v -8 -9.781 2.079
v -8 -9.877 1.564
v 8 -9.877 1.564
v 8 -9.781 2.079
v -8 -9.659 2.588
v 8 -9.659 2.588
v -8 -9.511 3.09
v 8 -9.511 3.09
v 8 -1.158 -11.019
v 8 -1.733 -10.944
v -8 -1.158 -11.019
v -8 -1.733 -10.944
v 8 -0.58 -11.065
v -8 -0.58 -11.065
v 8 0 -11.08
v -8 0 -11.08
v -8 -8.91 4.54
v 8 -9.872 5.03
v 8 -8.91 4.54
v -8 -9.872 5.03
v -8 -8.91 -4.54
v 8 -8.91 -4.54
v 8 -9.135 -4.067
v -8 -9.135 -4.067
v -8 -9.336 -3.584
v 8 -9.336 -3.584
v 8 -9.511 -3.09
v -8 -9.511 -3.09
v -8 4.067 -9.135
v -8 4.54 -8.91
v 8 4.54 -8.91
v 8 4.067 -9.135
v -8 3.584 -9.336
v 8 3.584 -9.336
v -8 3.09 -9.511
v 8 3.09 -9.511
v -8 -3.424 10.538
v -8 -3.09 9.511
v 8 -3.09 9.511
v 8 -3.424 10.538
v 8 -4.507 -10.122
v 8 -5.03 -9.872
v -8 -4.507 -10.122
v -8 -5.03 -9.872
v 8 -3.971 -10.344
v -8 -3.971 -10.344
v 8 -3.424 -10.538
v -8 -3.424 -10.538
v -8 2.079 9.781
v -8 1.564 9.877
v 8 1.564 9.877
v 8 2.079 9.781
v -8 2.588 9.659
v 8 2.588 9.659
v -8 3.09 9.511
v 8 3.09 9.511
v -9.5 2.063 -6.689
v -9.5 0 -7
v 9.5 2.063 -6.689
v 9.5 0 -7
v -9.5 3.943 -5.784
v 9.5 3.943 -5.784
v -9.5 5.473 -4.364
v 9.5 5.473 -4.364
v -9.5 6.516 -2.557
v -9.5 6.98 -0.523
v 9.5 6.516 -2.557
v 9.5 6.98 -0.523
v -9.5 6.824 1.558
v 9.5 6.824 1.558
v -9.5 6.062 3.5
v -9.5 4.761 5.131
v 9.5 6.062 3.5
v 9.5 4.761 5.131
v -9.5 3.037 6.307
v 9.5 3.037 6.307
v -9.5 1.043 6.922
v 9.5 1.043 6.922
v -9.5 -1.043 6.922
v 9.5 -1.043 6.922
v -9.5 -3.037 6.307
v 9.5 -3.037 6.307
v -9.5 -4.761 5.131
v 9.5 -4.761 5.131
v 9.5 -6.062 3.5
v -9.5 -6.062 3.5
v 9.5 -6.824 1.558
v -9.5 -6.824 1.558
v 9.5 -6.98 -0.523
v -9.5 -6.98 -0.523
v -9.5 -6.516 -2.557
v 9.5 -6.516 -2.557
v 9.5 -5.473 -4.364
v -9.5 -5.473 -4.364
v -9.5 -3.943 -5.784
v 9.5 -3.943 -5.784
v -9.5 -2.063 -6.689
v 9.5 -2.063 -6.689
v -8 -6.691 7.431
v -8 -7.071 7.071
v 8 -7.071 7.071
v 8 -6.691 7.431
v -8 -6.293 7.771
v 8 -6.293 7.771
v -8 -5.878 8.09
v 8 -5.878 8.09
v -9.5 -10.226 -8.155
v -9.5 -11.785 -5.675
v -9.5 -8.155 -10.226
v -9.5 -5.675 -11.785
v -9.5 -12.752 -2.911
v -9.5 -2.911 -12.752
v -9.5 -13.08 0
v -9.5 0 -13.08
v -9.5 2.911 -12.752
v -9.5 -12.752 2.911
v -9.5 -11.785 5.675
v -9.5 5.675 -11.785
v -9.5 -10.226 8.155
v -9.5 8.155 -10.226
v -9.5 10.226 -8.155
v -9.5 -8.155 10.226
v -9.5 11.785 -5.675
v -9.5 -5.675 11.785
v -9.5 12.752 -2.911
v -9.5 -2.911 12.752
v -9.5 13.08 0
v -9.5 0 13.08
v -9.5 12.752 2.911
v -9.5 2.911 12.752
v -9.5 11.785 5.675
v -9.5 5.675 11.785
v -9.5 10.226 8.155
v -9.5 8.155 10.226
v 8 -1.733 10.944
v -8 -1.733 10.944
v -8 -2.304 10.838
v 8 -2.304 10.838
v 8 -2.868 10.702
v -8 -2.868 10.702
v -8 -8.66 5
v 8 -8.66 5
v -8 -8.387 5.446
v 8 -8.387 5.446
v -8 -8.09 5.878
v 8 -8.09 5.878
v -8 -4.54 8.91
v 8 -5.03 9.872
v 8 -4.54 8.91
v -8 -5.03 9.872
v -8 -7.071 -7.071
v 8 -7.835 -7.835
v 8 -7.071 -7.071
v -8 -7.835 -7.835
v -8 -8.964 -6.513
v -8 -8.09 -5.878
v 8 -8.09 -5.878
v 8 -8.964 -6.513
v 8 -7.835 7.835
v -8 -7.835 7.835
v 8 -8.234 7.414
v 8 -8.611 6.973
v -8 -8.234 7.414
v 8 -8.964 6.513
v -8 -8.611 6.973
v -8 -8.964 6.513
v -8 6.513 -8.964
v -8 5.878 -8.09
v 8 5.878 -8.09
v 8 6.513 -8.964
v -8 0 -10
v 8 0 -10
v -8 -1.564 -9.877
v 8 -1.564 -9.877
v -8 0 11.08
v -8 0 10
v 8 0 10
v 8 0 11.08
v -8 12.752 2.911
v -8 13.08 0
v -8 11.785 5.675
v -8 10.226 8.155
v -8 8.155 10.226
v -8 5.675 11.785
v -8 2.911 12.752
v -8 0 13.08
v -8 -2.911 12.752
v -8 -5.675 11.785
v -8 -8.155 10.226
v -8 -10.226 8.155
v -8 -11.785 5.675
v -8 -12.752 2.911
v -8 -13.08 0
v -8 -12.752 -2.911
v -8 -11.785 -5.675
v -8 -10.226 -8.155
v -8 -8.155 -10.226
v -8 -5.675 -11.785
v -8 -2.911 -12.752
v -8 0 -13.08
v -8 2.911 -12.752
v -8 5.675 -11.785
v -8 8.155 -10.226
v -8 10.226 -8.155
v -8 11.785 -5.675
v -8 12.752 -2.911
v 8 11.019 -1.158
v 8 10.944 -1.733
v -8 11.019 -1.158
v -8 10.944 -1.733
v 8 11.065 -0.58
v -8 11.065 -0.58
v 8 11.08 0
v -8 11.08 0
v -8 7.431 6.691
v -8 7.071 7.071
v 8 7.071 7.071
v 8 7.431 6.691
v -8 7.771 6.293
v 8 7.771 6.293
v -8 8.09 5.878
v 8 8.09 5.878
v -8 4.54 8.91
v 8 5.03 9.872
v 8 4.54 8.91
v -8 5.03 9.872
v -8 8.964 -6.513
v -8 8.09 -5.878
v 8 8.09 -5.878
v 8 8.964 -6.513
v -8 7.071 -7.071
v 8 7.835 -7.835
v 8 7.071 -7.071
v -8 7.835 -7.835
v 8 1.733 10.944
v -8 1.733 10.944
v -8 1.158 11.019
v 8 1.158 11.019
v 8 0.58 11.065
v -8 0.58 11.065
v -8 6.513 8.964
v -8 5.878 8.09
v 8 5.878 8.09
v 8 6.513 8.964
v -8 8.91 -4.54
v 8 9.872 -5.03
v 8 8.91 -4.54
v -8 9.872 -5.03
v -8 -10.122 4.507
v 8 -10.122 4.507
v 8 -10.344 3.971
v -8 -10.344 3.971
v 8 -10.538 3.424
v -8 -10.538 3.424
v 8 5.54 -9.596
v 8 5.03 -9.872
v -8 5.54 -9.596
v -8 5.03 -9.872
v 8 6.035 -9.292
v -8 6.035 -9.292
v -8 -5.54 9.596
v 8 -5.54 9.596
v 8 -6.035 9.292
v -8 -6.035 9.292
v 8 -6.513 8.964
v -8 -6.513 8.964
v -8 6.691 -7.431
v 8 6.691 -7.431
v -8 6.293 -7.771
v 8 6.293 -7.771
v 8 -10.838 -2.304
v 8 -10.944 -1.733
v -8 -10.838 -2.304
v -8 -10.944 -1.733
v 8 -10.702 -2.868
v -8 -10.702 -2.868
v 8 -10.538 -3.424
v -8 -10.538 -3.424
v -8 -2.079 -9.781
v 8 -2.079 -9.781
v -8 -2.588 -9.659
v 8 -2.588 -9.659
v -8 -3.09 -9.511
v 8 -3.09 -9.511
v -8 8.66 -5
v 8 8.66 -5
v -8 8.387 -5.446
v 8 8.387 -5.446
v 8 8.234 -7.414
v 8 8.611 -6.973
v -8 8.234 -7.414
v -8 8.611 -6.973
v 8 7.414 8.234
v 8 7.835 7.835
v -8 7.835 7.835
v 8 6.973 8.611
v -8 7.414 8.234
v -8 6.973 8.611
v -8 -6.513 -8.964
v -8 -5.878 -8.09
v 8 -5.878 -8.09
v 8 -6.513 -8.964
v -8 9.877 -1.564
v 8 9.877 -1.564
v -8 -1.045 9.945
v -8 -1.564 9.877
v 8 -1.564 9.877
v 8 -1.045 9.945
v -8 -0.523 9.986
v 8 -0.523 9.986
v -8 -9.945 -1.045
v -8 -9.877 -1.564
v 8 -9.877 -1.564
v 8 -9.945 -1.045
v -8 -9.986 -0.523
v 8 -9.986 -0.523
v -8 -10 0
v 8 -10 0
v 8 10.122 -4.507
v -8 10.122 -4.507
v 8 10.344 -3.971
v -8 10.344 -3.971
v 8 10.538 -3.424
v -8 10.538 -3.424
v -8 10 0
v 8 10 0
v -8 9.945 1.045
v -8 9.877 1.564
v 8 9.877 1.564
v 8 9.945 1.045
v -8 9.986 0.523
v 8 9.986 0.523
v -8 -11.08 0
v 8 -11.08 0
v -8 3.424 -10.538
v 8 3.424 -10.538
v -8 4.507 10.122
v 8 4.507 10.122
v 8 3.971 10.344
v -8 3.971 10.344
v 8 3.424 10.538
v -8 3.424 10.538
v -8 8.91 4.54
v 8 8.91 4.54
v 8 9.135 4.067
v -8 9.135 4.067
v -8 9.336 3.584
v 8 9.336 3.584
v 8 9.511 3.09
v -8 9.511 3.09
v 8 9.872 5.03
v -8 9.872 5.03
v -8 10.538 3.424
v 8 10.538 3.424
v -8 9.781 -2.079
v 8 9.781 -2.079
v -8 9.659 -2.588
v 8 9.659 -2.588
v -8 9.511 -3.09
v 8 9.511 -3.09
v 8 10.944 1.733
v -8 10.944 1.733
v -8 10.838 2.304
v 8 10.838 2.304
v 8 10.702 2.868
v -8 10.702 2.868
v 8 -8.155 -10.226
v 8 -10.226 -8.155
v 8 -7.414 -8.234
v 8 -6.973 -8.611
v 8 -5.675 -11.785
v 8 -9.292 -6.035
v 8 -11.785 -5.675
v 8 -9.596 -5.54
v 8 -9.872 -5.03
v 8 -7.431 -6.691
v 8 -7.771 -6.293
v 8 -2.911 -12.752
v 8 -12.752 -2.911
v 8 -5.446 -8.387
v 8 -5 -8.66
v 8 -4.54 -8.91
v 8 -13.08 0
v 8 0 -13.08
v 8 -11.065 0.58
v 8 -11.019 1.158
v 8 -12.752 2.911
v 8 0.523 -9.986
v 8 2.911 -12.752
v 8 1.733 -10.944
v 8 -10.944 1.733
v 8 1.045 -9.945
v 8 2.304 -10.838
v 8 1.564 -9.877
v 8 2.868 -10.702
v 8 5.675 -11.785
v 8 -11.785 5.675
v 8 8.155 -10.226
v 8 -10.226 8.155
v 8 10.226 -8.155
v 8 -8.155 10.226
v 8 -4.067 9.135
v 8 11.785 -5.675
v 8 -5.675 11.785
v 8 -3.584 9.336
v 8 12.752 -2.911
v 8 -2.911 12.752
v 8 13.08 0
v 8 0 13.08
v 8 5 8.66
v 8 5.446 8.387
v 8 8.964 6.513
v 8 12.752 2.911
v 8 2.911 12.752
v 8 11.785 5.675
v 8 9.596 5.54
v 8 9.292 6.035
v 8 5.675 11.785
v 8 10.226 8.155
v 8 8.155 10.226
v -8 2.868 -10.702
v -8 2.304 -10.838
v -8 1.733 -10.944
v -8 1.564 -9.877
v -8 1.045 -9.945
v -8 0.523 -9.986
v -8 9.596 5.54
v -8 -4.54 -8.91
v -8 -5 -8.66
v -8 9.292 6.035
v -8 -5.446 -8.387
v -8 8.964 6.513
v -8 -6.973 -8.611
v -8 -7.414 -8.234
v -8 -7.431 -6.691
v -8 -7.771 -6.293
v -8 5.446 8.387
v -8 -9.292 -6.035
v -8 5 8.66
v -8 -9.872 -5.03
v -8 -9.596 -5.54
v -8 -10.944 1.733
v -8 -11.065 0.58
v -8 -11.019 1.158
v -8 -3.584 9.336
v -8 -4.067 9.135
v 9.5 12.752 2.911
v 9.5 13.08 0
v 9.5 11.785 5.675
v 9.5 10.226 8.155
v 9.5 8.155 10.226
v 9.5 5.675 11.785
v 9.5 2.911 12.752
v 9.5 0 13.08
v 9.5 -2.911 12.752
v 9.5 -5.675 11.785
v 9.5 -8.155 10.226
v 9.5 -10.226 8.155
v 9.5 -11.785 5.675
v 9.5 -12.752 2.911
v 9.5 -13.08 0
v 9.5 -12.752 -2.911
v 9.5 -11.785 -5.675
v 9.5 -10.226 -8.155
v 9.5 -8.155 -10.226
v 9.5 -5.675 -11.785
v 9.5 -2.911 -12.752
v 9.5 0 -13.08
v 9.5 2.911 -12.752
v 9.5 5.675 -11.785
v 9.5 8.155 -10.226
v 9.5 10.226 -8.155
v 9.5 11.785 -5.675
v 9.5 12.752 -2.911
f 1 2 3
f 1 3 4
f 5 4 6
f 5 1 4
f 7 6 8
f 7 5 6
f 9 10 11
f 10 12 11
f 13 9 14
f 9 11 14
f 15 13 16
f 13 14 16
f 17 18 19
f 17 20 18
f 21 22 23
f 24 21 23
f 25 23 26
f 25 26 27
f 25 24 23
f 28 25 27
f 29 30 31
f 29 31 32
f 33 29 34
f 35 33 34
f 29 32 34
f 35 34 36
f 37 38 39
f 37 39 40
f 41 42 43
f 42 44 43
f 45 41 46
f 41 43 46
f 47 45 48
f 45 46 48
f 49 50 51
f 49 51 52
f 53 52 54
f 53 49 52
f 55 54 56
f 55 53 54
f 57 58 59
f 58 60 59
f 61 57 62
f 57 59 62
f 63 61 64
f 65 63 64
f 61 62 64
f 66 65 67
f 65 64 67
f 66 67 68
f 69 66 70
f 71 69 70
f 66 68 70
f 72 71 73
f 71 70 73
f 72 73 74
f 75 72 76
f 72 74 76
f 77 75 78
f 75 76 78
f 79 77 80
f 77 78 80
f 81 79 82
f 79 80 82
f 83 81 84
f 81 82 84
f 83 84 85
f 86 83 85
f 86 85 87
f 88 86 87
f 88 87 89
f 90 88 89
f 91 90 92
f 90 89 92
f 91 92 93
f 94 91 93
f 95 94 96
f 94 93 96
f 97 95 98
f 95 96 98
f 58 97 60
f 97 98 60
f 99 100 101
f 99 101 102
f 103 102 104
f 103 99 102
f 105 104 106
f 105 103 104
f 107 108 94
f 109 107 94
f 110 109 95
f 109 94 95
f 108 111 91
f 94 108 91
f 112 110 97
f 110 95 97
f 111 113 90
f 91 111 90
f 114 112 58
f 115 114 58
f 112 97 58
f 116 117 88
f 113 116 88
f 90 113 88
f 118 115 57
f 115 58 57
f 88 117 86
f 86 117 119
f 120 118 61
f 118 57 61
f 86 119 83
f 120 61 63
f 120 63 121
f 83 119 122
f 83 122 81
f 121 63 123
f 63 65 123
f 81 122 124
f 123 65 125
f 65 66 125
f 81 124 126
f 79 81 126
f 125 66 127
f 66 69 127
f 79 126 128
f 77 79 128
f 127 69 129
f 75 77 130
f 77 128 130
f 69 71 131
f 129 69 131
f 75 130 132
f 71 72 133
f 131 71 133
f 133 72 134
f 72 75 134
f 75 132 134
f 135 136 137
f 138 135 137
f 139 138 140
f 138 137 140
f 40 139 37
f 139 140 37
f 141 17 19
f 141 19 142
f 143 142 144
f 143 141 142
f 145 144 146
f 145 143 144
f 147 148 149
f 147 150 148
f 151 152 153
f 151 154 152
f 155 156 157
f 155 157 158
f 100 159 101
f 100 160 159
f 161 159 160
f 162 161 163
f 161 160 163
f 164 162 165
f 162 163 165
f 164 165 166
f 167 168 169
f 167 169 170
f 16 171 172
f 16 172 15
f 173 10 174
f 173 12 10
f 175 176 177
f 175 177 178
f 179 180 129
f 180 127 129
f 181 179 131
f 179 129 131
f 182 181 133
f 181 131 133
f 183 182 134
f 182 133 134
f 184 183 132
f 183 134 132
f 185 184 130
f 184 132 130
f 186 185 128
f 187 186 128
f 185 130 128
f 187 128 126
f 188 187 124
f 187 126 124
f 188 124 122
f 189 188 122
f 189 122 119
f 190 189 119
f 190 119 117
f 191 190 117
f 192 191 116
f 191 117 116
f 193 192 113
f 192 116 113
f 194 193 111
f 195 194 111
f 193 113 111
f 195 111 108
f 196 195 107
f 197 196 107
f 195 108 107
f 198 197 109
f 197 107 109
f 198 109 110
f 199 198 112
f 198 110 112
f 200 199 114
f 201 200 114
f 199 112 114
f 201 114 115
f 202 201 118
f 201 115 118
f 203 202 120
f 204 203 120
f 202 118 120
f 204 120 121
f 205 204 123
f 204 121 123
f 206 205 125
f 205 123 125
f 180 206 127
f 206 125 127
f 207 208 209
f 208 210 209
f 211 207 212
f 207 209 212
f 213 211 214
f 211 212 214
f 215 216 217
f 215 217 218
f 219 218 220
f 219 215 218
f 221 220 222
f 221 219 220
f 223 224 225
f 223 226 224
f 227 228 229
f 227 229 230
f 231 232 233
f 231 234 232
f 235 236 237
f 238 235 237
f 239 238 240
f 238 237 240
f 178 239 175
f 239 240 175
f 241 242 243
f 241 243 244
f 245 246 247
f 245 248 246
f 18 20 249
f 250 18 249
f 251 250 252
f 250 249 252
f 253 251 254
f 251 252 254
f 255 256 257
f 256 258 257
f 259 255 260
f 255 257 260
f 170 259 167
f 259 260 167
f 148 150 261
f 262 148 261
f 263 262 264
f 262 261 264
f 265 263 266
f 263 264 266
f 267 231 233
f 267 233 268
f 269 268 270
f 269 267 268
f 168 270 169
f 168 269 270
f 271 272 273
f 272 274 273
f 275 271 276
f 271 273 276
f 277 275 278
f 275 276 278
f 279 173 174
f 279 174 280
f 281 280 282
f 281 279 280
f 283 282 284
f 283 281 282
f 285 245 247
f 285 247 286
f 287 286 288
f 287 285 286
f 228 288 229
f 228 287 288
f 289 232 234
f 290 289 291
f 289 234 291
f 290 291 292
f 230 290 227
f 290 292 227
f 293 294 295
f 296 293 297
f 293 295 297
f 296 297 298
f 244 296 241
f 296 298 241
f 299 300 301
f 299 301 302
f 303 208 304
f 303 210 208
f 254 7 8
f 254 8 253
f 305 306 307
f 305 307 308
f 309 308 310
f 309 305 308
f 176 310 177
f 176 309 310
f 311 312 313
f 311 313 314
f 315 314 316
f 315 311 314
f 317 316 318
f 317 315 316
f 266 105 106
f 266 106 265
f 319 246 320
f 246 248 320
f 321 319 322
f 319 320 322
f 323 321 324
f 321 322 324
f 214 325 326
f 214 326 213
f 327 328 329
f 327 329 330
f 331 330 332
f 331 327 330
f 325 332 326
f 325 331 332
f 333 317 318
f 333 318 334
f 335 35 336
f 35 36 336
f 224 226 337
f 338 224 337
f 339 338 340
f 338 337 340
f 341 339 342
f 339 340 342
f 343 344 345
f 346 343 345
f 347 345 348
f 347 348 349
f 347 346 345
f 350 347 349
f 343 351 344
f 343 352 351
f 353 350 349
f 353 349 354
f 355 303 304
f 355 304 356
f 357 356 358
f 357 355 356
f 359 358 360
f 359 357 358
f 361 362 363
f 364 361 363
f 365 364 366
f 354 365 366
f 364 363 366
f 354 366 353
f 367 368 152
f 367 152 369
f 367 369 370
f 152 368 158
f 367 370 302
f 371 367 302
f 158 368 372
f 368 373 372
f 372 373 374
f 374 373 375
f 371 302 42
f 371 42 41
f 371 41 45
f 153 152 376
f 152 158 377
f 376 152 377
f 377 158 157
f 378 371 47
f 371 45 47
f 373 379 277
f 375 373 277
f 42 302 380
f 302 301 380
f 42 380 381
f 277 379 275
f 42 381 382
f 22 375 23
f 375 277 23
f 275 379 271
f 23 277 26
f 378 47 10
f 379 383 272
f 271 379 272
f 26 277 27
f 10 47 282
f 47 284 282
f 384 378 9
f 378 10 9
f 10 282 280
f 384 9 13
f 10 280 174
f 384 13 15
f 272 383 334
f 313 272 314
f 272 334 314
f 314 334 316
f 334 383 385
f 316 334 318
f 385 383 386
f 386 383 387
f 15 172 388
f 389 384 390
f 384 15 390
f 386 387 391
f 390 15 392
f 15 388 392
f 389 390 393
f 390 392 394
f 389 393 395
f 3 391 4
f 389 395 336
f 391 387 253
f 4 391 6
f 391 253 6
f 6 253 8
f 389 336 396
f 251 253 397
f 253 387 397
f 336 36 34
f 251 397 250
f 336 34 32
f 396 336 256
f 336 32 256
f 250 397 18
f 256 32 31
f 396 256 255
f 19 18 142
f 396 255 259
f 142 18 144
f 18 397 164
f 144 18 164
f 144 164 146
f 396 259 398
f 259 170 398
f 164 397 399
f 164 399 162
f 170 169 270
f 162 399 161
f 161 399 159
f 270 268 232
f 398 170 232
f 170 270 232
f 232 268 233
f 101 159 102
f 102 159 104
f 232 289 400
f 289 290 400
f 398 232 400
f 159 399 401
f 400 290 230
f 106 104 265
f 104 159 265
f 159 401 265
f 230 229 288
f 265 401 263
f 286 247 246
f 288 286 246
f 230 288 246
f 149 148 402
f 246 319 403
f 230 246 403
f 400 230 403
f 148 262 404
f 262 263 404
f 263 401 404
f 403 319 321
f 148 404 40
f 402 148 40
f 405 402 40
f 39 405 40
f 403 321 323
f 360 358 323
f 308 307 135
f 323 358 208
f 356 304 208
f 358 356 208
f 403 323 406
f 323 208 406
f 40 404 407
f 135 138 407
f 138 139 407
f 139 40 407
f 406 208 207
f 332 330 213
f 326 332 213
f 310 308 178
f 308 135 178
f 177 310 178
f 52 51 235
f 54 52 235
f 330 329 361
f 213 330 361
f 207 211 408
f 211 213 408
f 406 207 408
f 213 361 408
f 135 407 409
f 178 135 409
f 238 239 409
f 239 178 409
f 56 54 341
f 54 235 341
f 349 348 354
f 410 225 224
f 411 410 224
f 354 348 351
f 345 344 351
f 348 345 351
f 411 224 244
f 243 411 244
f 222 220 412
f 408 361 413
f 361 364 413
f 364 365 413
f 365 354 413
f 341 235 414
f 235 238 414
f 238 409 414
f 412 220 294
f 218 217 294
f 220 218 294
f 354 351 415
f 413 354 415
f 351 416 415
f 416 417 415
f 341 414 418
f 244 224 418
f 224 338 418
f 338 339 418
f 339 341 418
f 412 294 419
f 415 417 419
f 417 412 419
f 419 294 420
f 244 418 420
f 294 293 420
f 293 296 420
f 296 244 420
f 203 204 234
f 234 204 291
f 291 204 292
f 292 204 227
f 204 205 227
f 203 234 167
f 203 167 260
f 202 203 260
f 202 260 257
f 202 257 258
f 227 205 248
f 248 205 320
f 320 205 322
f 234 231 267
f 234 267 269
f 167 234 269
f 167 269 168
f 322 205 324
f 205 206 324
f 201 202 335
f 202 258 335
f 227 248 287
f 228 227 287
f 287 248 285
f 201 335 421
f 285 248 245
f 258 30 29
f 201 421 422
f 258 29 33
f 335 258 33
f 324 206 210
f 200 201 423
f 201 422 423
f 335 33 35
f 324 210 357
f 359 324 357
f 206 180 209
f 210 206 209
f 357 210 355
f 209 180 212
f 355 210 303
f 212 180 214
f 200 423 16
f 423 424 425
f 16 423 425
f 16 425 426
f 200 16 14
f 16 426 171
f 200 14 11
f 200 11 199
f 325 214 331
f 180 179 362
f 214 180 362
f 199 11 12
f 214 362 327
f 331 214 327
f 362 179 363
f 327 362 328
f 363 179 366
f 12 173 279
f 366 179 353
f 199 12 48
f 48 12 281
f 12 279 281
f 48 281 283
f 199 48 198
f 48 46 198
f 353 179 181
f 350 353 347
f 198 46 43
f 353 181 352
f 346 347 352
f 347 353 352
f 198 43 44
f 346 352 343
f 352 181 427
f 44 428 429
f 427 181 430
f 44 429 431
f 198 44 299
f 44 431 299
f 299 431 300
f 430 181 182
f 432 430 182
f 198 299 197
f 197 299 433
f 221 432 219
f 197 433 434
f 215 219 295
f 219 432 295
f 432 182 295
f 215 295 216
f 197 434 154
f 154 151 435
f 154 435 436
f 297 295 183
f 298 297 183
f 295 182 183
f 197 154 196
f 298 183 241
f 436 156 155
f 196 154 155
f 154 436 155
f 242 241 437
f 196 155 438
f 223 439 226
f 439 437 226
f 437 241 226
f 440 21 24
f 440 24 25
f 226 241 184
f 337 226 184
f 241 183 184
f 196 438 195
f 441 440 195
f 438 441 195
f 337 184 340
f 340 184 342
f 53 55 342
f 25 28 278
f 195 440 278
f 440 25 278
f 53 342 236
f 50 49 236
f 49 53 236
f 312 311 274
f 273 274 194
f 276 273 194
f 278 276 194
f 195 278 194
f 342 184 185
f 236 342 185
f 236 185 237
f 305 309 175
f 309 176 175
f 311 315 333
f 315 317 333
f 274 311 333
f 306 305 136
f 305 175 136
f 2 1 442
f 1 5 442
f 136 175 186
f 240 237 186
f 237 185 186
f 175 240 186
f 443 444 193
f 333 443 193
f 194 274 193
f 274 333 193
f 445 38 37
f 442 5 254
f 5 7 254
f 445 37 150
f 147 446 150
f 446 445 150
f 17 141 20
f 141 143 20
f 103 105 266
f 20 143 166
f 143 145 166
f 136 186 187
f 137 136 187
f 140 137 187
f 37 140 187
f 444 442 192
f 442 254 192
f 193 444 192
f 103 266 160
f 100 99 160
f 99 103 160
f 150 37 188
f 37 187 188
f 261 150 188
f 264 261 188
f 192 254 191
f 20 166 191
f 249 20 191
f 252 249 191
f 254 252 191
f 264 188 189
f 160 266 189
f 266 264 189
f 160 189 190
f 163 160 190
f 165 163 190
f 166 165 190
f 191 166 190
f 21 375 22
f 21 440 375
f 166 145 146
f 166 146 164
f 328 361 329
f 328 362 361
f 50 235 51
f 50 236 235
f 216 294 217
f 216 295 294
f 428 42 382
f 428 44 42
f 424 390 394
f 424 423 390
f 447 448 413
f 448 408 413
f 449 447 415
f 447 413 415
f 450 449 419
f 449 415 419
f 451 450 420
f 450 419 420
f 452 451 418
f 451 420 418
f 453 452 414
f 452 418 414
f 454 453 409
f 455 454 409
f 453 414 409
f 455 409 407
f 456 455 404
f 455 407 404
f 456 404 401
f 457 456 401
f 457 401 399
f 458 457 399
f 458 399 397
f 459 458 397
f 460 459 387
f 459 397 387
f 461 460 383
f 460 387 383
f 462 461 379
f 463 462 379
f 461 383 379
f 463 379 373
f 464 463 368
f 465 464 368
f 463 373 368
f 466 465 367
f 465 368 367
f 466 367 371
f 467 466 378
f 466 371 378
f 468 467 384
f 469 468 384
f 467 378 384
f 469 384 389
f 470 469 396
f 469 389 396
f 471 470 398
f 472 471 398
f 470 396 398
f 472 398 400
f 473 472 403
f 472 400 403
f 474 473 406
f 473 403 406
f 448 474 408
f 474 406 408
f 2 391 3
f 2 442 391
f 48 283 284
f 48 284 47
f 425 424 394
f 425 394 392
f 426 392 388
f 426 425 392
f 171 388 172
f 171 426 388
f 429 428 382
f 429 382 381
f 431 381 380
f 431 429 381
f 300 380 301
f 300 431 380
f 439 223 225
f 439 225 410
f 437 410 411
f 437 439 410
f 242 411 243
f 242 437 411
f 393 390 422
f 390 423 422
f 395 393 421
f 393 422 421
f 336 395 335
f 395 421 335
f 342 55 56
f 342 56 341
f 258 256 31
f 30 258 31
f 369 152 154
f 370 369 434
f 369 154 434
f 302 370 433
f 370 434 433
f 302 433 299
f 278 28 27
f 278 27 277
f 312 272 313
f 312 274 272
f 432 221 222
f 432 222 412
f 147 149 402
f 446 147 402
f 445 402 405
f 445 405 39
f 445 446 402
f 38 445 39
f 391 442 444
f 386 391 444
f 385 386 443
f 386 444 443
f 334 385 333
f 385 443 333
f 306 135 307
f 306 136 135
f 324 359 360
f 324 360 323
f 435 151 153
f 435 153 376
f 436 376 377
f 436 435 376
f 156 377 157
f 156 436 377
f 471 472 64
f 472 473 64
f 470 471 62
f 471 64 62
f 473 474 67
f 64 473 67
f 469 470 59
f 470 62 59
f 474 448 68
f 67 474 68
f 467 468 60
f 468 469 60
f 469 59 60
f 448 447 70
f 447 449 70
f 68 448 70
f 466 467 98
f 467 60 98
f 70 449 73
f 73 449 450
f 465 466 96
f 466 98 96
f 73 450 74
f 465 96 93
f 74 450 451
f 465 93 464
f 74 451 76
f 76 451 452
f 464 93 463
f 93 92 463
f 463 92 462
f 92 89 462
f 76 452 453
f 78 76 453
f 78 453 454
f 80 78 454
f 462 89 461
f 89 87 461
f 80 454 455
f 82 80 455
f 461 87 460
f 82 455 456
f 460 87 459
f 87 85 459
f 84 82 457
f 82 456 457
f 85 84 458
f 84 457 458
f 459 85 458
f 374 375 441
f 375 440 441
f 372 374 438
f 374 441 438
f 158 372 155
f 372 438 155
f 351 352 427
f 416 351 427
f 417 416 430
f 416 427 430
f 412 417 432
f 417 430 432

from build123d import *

# Parameters (mm, degrees)
SKETCH_7_R          = 7
CUT_EXTRUDE_3_DEPTH = 10
CUT_EXTRUDE_4_DEPTH = 8


with BuildPart() as part:
    # 草图1 → 旋转1 (revolve)
    with BuildSketch(Plane.XY):
        Polygon((-9.5, 0), (9.5, 0), (9.5, 13.08), (8, 13.08), (8, 11.08), (-8, 11.08), (-8, 13.08), (-9.5, 13.08), align=None)
    revolve(axis=Axis((-9.5, 0, 0), (1, 0, 0)))

    # 草图7 → 切除-拉伸3 (cut, symmetric)
    with BuildSketch(Plane(origin=(0, 0, 0), x_dir=(0, 0, -1), z_dir=(1, 0, 0))):
        Circle(SKETCH_7_R)
    extrude(amount=CUT_EXTRUDE_3_DEPTH, both=True, mode=Mode.SUBTRACT)

    # 草图2 → 切除-拉伸4 (cut, symmetric)
    with BuildSketch(Plane(origin=(0, 0, 0), x_dir=(0, 0, -1), z_dir=(1, 0, 0))):
        with BuildLine():
            Line((10, 0), (11.08, 0))
            ThreePointArc((11.08, 0), (11.045844058, 0.869326781), (10.943586814, 1.733293873))
            Line((10.943586814, 1.733293873), (9.876883406, 1.56434465))
            ThreePointArc((9.876883406, 1.56434465), (9.969173337, 0.784590957), (10, 0))
        make_face()
        with BuildLine():
            Line((9.510565163, -3.090169944), (10.537706201, -3.423908298))
            ThreePointArc((10.537706201, -3.423908298), (10.773858718, -2.586574632), (10.943586814, -1.733293873))
            Line((10.943586814, -1.733293873), (9.876883406, -1.56434465))
            ThreePointArc((9.876883406, -1.56434465), (9.723699204, -2.334453639), (9.510565163, -3.090169944))
        make_face()
        with BuildLine():
            Line((8.090169944, -5.877852523), (8.963908298, -6.512660595))
            ThreePointArc((8.963908298, -6.512660595), (9.447253021, -5.789284097), (9.872352288, -5.030214737))
            Line((9.872352288, -5.030214737), (8.910065242, -4.539904997))
            ThreePointArc((8.910065242, -4.539904997), (8.526401644, -5.224985647), (8.090169944, -5.877852523))
        make_face()
        with BuildLine():
            Line((5.877852523, -8.090169944), (6.512660595, -8.963908298))
            ThreePointArc((6.512660595, -8.963908298), (7.195884375, -8.425298099), (7.834743136, -7.834743136))
            Line((7.834743136, -7.834743136), (7.071067812, -7.071067812))
            ThreePointArc((7.071067812, -7.071067812), (6.494480483, -7.604059656), (5.877852523, -8.090169944))
        make_face()
        with BuildLine():
            Line((3.090169944, -9.510565163), (3.423908298, -10.537706201))
            ThreePointArc((3.423908298, -10.537706201), (4.240132431, -10.23658522), (5.030214737, -9.872352288))
            Line((5.030214737, -9.872352288), (4.539904997, -8.910065242))
            ThreePointArc((4.539904997, -8.910065242), (3.826834324, -9.238795325), (3.090169944, -9.510565163))
        make_face()
        with BuildLine():
            Line((0, -10), (0, -11.08))
            ThreePointArc((0, -11.08), (0.869326781, -11.045844058), (1.733293873, -10.943586814))
            Line((1.733293873, -10.943586814), (1.56434465, -9.876883406))
            ThreePointArc((1.56434465, -9.876883406), (0.784590957, -9.969173337), (0, -10))
        make_face()
        with BuildLine():
            Line((-3.090169944, -9.510565163), (-3.423908298, -10.537706201))
            ThreePointArc((-3.423908298, -10.537706201), (-2.586574632, -10.773858718), (-1.733293873, -10.943586814))
            Line((-1.733293873, -10.943586814), (-1.56434465, -9.876883406))
            ThreePointArc((-1.56434465, -9.876883406), (-2.334453639, -9.723699204), (-3.090169944, -9.510565163))
        make_face()
        with BuildLine():
            Line((-5.877852523, -8.090169944), (-6.512660595, -8.963908298))
            ThreePointArc((-6.512660595, -8.963908298), (-5.789284097, -9.447253021), (-5.030214737, -9.872352288))
            Line((-5.030214737, -9.872352288), (-4.539904997, -8.910065242))
            ThreePointArc((-4.539904997, -8.910065242), (-5.224985647, -8.526401644), (-5.877852523, -8.090169944))
        make_face()
        with BuildLine():
            Line((-8.090169944, -5.877852523), (-8.963908298, -6.512660595))
            ThreePointArc((-8.963908298, -6.512660595), (-8.425298099, -7.195884375), (-7.834743136, -7.834743136))
            Line((-7.834743136, -7.834743136), (-7.071067812, -7.071067812))
            ThreePointArc((-7.071067812, -7.071067812), (-7.604059656, -6.494480483), (-8.090169944, -5.877852523))
        make_face()
        with BuildLine():
            Line((-9.510565163, -3.090169944), (-10.537706201, -3.423908298))
            ThreePointArc((-10.537706201, -3.423908298), (-10.23658522, -4.240132431), (-9.872352288, -5.030214737))
            Line((-9.872352288, -5.030214737), (-8.910065242, -4.539904997))
            ThreePointArc((-8.910065242, -4.539904997), (-9.238795325, -3.826834324), (-9.510565163, -3.090169944))
        make_face()
        with BuildLine():
            Line((-10, 0), (-11.08, 0))
            ThreePointArc((-11.08, 0), (-11.045844058, -0.869326781), (-10.943586814, -1.733293873))
            Line((-10.943586814, -1.733293873), (-9.876883406, -1.56434465))
            ThreePointArc((-9.876883406, -1.56434465), (-9.969173337, -0.784590957), (-10, 0))
        make_face()
        with BuildLine():
            Line((-9.510565163, 3.090169944), (-10.537706201, 3.423908298))
            ThreePointArc((-10.537706201, 3.423908298), (-10.773858718, 2.586574632), (-10.943586814, 1.733293873))
            Line((-10.943586814, 1.733293873), (-9.876883406, 1.56434465))
            ThreePointArc((-9.876883406, 1.56434465), (-9.723699204, 2.334453639), (-9.510565163, 3.090169944))
        make_face()
        with BuildLine():
            Line((-8.090169944, 5.877852523), (-8.963908298, 6.512660595))
            ThreePointArc((-8.963908298, 6.512660595), (-9.447253021, 5.789284097), (-9.872352288, 5.030214737))
            Line((-9.872352288, 5.030214737), (-8.910065242, 4.539904997))
            ThreePointArc((-8.910065242, 4.539904997), (-8.526401644, 5.224985647), (-8.090169944, 5.877852523))
        make_face()
        with BuildLine():
            Line((-5.877852523, 8.090169944), (-6.512660595, 8.963908298))
            ThreePointArc((-6.512660595, 8.963908298), (-7.195884375, 8.425298099), (-7.834743136, 7.834743136))
            Line((-7.834743136, 7.834743136), (-7.071067812, 7.071067812))
            ThreePointArc((-7.071067812, 7.071067812), (-6.494480483, 7.604059656), (-5.877852523, 8.090169944))
        make_face()
        with BuildLine():
            Line((-3.090169944, 9.510565163), (-3.423908298, 10.537706201))
            ThreePointArc((-3.423908298, 10.537706201), (-4.240132431, 10.23658522), (-5.030214737, 9.872352288))
            Line((-5.030214737, 9.872352288), (-4.539904997, 8.910065242))
            ThreePointArc((-4.539904997, 8.910065242), (-3.826834324, 9.238795325), (-3.090169944, 9.510565163))
        make_face()
        with BuildLine():
            Line((0, 10), (0, 11.08))
            ThreePointArc((0, 11.08), (-0.869326781, 11.045844058), (-1.733293873, 10.943586814))
            Line((-1.733293873, 10.943586814), (-1.56434465, 9.876883406))
            ThreePointArc((-1.56434465, 9.876883406), (-0.784590957, 9.969173337), (0, 10))
        make_face()
        with BuildLine():
            Line((3.090169944, 9.510565163), (3.423908298, 10.537706201))
            ThreePointArc((3.423908298, 10.537706201), (2.586574632, 10.773858718), (1.733293873, 10.943586814))
            Line((1.733293873, 10.943586814), (1.56434465, 9.876883406))
            ThreePointArc((1.56434465, 9.876883406), (2.334453639, 9.723699204), (3.090169944, 9.510565163))
        make_face()
        with BuildLine():
            Line((5.877852523, 8.090169944), (6.512660595, 8.963908298))
            ThreePointArc((6.512660595, 8.963908298), (5.789284097, 9.447253021), (5.030214737, 9.872352288))
            Line((5.030214737, 9.872352288), (4.539904997, 8.910065242))
            ThreePointArc((4.539904997, 8.910065242), (5.224985647, 8.526401644), (5.877852523, 8.090169944))
        make_face()
        with BuildLine():
            Line((8.090169944, 5.877852523), (8.963908298, 6.512660595))
            ThreePointArc((8.963908298, 6.512660595), (8.425298099, 7.195884375), (7.834743136, 7.834743136))
            Line((7.834743136, 7.834743136), (7.071067812, 7.071067812))
            ThreePointArc((7.071067812, 7.071067812), (7.604059656, 6.494480483), (8.090169944, 5.877852523))
        make_face()
        with BuildLine():
            Line((9.510565163, 3.090169944), (10.537706201, 3.423908298))
            ThreePointArc((10.537706201, 3.423908298), (10.23658522, 4.240132431), (9.872352288, 5.030214737))
            Line((9.872352288, 5.030214737), (8.910065242, 4.539904997))
            ThreePointArc((8.910065242, 4.539904997), (9.238795325, 3.826834324), (9.510565163, 3.090169944))
        make_face()
    extrude(amount=CUT_EXTRUDE_4_DEPTH, both=True, mode=Mode.SUBTRACT)


solid = part.part
